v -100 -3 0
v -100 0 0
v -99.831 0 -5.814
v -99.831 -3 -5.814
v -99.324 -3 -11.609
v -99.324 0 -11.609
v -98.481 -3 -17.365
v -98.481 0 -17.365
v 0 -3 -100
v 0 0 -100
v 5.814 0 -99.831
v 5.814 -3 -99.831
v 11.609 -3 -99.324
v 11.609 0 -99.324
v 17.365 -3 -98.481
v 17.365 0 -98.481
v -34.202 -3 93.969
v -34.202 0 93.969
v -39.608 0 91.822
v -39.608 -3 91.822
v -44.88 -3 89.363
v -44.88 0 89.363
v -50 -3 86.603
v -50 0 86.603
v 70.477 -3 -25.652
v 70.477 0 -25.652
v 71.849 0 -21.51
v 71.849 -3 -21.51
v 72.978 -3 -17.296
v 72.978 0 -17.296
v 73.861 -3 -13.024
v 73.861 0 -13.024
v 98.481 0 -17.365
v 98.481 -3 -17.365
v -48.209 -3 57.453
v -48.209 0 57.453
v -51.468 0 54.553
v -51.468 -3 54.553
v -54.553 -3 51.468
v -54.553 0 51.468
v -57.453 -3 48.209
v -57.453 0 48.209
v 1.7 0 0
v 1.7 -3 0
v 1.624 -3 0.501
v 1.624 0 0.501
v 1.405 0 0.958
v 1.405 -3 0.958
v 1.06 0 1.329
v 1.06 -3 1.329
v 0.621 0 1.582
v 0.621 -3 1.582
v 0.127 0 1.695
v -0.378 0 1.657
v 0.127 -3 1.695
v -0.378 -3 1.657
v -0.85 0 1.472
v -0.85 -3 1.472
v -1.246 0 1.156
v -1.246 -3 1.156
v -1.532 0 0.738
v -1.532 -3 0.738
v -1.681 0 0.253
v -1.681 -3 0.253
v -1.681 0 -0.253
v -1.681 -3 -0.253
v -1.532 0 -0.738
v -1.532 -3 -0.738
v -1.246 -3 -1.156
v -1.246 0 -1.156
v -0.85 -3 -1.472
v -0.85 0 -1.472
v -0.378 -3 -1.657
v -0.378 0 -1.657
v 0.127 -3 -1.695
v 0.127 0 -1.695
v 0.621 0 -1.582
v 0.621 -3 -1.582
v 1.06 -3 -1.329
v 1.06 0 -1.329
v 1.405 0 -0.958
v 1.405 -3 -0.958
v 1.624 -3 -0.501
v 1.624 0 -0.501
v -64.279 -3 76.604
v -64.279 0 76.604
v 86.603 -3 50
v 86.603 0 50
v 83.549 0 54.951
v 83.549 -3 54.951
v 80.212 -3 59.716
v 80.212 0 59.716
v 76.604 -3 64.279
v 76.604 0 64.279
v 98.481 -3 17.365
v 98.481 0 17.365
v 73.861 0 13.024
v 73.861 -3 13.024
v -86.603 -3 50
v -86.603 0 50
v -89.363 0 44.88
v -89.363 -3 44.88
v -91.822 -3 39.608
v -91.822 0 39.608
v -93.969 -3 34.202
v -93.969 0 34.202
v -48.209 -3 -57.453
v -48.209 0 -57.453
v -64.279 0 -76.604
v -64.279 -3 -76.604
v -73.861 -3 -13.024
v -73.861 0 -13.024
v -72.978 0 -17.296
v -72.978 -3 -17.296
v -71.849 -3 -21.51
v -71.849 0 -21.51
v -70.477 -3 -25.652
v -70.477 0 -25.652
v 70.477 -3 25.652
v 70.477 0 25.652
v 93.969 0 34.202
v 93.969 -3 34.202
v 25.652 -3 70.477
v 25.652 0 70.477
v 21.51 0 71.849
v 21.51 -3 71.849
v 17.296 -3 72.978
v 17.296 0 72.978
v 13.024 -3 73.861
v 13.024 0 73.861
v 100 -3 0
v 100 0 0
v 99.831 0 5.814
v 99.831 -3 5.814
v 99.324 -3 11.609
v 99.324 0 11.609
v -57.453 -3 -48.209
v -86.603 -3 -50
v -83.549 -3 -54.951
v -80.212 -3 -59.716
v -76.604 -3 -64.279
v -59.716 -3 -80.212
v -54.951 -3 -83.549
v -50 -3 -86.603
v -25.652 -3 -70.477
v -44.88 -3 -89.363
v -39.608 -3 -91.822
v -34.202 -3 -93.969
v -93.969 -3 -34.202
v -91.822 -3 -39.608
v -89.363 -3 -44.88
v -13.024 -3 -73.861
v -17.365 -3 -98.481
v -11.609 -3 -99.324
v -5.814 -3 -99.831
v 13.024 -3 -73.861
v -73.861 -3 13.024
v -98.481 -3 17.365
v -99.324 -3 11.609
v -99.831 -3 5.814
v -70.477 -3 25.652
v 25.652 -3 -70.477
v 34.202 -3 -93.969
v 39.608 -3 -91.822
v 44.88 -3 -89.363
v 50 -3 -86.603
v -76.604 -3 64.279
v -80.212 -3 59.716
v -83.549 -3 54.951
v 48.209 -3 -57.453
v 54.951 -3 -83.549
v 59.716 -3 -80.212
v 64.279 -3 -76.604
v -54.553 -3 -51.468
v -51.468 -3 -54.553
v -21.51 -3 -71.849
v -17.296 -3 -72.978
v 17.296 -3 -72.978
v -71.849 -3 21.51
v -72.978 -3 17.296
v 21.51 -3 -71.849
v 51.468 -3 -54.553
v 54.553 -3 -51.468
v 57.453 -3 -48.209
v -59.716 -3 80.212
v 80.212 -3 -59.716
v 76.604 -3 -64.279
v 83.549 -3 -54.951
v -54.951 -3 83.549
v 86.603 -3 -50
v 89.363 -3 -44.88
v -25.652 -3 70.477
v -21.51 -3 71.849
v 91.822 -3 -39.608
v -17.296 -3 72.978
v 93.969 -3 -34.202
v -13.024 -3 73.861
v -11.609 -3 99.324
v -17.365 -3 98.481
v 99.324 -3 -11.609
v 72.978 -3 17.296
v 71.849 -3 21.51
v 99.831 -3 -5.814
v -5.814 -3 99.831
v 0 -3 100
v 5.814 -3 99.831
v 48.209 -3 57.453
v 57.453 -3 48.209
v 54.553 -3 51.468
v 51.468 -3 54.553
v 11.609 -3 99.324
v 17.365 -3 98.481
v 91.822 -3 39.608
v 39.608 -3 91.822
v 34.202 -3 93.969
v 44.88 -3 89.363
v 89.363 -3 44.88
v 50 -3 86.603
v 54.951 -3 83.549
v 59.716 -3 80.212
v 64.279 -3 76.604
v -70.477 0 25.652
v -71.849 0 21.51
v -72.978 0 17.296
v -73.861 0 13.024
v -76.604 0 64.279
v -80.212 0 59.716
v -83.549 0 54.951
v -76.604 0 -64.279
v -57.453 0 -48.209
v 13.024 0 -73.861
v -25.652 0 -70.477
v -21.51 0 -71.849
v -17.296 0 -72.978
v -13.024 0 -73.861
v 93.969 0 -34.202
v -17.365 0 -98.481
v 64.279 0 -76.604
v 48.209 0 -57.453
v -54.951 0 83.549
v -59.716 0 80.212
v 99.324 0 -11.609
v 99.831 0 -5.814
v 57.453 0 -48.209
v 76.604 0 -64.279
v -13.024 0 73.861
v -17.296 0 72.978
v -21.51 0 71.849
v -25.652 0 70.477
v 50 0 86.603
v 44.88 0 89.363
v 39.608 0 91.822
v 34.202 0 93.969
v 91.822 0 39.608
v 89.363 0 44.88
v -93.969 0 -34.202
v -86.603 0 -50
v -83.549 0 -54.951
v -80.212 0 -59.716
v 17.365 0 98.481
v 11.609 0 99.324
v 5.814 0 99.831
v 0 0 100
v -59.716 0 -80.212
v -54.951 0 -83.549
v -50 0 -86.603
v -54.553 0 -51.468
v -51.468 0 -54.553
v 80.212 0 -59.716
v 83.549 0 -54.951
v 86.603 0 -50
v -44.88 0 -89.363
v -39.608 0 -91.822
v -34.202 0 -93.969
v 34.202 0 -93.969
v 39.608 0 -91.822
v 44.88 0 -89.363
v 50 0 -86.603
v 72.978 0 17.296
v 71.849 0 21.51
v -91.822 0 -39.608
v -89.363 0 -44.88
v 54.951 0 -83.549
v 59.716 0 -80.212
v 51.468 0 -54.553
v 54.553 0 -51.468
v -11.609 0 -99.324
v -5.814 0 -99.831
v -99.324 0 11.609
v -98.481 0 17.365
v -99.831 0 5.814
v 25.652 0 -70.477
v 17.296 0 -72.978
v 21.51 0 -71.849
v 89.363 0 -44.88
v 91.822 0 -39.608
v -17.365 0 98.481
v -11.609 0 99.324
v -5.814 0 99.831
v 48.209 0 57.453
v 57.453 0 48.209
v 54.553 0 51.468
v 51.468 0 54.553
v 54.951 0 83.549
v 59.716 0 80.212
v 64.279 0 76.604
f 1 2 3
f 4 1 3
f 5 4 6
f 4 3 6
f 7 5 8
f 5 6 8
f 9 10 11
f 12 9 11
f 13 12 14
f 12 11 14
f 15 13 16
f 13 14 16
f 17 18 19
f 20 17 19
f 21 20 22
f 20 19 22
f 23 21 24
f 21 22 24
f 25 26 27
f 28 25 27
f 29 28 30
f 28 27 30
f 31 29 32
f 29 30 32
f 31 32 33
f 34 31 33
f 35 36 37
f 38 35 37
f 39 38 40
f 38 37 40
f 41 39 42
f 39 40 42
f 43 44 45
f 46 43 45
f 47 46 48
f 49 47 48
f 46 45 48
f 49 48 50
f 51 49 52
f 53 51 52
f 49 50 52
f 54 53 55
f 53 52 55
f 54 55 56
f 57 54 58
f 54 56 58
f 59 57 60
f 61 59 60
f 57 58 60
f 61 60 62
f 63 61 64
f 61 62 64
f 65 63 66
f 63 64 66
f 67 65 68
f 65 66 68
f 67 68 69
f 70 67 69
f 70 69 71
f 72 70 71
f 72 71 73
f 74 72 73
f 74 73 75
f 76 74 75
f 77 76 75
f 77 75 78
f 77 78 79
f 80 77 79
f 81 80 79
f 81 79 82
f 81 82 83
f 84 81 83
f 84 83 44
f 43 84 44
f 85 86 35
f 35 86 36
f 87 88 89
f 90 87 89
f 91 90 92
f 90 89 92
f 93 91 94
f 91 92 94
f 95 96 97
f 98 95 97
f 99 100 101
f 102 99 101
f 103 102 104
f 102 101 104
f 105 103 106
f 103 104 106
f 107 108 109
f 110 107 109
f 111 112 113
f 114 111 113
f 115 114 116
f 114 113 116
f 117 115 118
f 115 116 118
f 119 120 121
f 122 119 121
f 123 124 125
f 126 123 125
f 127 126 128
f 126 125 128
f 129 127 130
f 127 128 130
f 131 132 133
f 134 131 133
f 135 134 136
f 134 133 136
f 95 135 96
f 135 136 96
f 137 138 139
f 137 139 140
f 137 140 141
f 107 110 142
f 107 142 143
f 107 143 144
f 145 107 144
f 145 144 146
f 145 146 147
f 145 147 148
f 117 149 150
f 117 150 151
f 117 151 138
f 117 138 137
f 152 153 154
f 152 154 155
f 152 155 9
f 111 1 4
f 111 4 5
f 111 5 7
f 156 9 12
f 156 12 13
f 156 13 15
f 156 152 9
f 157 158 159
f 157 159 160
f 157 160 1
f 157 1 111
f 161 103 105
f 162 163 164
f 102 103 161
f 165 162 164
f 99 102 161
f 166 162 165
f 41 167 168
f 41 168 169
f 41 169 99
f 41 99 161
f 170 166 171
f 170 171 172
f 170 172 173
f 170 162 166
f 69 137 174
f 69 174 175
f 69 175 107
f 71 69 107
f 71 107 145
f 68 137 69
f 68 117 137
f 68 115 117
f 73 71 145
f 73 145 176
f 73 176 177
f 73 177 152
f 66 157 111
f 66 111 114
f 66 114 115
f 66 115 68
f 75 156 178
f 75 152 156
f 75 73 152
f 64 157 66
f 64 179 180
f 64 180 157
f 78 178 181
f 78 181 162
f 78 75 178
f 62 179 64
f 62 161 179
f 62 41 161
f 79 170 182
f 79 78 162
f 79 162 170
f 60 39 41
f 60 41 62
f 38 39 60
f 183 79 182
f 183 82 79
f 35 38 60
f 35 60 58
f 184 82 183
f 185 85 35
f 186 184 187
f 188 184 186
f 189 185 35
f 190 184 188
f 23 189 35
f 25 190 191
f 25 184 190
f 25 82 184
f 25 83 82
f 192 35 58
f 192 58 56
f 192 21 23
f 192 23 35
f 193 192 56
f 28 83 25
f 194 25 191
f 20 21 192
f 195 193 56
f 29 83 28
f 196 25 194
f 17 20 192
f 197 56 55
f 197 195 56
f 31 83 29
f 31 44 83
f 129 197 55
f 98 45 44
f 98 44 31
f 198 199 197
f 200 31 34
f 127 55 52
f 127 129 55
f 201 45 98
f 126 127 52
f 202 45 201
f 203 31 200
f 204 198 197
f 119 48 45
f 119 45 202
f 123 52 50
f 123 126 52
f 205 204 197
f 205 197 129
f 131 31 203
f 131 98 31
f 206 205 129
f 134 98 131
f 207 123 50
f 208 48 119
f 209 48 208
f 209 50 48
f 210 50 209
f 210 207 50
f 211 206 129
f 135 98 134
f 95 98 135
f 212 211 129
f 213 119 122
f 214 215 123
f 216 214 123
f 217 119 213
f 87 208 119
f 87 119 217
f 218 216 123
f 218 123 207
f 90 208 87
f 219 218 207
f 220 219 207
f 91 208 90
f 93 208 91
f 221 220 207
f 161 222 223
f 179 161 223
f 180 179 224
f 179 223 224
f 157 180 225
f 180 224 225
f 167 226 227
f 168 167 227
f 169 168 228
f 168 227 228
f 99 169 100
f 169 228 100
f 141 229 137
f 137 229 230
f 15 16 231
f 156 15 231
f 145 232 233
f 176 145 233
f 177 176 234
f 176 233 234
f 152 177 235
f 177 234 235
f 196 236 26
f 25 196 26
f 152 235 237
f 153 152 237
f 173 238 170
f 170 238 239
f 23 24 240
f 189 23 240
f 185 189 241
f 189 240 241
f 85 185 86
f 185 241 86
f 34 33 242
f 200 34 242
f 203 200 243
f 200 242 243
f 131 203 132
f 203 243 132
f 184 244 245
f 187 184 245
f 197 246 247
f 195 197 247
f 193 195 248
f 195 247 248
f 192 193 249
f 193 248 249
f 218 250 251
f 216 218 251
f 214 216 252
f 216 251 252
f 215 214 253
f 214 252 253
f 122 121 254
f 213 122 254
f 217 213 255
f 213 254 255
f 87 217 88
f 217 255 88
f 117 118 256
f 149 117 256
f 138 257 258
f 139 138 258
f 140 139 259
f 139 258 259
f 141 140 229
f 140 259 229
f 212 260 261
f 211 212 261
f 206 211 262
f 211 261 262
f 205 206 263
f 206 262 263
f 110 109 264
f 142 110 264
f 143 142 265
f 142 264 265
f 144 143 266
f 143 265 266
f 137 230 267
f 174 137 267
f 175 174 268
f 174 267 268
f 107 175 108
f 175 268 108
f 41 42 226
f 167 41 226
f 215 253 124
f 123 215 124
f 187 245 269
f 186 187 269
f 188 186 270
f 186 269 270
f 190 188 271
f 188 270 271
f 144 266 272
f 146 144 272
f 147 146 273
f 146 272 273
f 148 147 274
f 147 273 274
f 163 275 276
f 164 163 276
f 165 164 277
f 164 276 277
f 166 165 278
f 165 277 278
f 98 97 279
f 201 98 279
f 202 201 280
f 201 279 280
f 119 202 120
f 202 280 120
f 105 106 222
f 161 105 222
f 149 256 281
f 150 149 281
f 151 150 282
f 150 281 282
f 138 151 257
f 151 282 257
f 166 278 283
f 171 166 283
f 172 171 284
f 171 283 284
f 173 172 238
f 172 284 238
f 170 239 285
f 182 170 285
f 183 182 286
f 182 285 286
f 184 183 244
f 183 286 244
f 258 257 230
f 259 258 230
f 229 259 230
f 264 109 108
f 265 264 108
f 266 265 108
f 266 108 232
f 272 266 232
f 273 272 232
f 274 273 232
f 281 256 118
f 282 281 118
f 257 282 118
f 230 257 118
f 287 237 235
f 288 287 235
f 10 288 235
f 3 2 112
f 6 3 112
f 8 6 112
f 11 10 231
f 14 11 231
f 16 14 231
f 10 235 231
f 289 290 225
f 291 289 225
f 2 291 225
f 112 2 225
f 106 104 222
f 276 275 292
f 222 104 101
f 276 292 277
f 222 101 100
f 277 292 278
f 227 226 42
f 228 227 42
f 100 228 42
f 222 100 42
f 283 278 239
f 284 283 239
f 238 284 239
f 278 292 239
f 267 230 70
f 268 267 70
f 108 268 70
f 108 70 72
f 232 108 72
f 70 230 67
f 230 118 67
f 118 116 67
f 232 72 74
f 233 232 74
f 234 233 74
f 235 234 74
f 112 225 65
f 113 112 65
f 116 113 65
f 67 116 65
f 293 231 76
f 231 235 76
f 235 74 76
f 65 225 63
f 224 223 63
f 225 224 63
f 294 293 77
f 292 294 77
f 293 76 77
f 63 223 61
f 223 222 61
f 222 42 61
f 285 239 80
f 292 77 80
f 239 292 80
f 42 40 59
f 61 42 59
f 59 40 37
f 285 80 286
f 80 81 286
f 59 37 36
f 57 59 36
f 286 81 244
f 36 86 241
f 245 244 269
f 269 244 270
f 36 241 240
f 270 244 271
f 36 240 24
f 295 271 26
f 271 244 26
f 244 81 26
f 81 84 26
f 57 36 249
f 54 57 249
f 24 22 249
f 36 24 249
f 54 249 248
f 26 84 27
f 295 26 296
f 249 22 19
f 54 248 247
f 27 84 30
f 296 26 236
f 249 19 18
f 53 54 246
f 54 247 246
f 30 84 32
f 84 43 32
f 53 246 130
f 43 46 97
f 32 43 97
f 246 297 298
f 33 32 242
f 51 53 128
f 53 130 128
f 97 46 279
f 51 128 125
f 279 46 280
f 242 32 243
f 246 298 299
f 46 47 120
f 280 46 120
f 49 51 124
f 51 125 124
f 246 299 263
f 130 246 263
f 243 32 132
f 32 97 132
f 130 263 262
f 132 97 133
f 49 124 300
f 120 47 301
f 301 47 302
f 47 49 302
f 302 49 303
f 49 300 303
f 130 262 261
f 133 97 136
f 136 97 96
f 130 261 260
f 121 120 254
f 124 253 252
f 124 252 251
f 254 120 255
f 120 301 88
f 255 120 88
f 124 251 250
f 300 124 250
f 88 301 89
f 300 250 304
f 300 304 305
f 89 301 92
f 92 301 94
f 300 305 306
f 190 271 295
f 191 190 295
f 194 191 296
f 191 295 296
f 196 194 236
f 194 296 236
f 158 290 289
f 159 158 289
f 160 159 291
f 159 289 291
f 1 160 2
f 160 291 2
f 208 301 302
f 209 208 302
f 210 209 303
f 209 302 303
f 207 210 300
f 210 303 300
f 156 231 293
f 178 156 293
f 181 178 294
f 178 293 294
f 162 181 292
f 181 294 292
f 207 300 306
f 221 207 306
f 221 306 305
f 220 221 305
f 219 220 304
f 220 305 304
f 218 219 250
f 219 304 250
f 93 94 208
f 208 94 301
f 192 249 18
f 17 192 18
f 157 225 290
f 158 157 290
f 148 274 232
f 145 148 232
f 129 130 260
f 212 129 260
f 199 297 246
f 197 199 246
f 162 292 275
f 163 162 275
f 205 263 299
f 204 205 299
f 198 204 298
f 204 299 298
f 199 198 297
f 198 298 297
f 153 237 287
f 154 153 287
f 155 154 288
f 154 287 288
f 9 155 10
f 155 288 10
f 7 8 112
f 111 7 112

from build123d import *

# Parameters (mm, degrees)
F1_DEPTH = 3
F2_R     = 1.7
F3_DEPTH = 3.001


with BuildPart() as f1:
    # F0 (on Front) → F1 (new body)
    with BuildSketch(Plane.XZ):
        with BuildLine():
            Line((0, 0), (75, 0))
            ThreePointArc((75, 0), (74.7146023569, 6.5366807061), (73.8605814759, 13.023613325))
            Line((73.8605814759, 13.023613325), (0, 0))
        make_face()
        with BuildLine():
            Line((100, 0), (75, 0))
            ThreePointArc((75, 0), (74.7146023569, -6.5366807061), (73.8605814759, -13.023613325))
            Line((73.8605814759, -13.023613325), (98.4807753012, -17.3648177667))
            ThreePointArc((98.4807753012, -17.3648177667), (99.6194698092, -8.7155742748), (100, 0))
        make_face()
        with BuildLine():
            ThreePointArc((73.8605814759, -13.023613325), (74.7146023569, -6.5366807061), (75, 0))
            Line((75, 0), (0, 0))
            Line((0, 0), (73.8605814759, -13.023613325))
        make_face()
        with BuildLine():
            ThreePointArc((73.8605814759, 13.023613325), (74.7146023569, 6.5366807061), (75, 0))
            Line((75, 0), (100, 0))
            ThreePointArc((100, 0), (99.6194698092, 8.7155742748), (98.4807753012, 17.3648177667))
            Line((98.4807753012, 17.3648177667), (73.8605814759, 13.023613325))
        make_face()
        with BuildLine():
            Line((0, 0), (73.8605814759, 13.023613325))
            ThreePointArc((73.8605814759, 13.023613325), (72.4444369717, 19.4114283827), (70.4769465589, 25.6515107494))
            Line((70.4769465589, 25.6515107494), (0, 0))
        make_face()
        with BuildLine():
            ThreePointArc((70.4769465589, -25.6515107494), (72.4444369717, -19.4114283827), (73.8605814759, -13.023613325))
            Line((73.8605814759, -13.023613325), (0, 0))
            Line((0, 0), (70.4769465589, -25.6515107494))
        make_face()
        with BuildLine():
            Line((-13.023613325, 73.8605814759), (0, 0))
            Line((0, 0), (0, 75))
            ThreePointArc((0, 75), (-6.5366807061, 74.7146023569), (-13.023613325, 73.8605814759))
        make_face()
        with BuildLine():
            Line((13.023613325, -73.8605814759), (0, 0))
            Line((0, 0), (0, -75))
            ThreePointArc((0, -75), (6.5366807061, -74.7146023569), (13.023613325, -73.8605814759))
        make_face()
        with BuildLine():
            Line((-73.8605814759, -13.023613325), (0, 0))
            Line((0, 0), (-75, 0))
            ThreePointArc((-75, 0), (-74.7146023569, -6.5366807061), (-73.8605814759, -13.023613325))
        make_face()
        with BuildLine():
            Line((25.6515107494, 70.4769465589), (0, 0))
            Line((0, 0), (37.5, 64.9519052838))
            ThreePointArc((37.5, 64.9519052838), (31.6963696306, 67.9730840277), (25.6515107494, 70.4769465589))
        make_face()
        with BuildLine():
            Line((57.4533332339, 48.2090707265), (0, 0))
            Line((0, 0), (64.9519052838, 37.5))
            ThreePointArc((64.9519052838, 37.5), (61.4364033217, 43.0182327263), (57.4533332339, 48.2090707265))
        make_face()
        with BuildLine():
            Line((70.4769465589, -25.6515107494), (0, 0))
            Line((0, 0), (64.9519052838, -37.5))
            ThreePointArc((64.9519052838, -37.5), (67.9730840277, -31.6963696306), (70.4769465589, -25.6515107494))
        make_face()
        with BuildLine():
            Line((48.2090707265, -57.4533332339), (0, 0))
            Line((0, 0), (37.5, -64.9519052838))
            ThreePointArc((37.5, -64.9519052838), (43.0182327263, -61.4364033217), (48.2090707265, -57.4533332339))
        make_face()
        with BuildLine():
            Line((-48.2090707265, 57.4533332339), (0, 0))
            Line((0, 0), (-37.5, 64.9519052838))
            ThreePointArc((-37.5, 64.9519052838), (-43.0182327263, 61.4364033217), (-48.2090707265, 57.4533332339))
        make_face()
        with BuildLine():
            Line((-70.4769465589, 25.6515107494), (0, 0))
            Line((0, 0), (-64.9519052838, 37.5))
            ThreePointArc((-64.9519052838, 37.5), (-67.9730840277, 31.6963696306), (-70.4769465589, 25.6515107494))
        make_face()
        with BuildLine():
            Line((-57.4533332339, -48.2090707265), (0, 0))
            Line((0, 0), (-64.9519052838, -37.5))
            ThreePointArc((-64.9519052838, -37.5), (-61.4364033217, -43.0182327263), (-57.4533332339, -48.2090707265))
        make_face()
        with BuildLine():
            Line((-25.6515107494, -70.4769465589), (0, 0))
            Line((0, 0), (-37.5, -64.9519052838))
            ThreePointArc((-37.5, -64.9519052838), (-31.6963696306, -67.9730840277), (-25.6515107494, -70.4769465589))
        make_face()
        with BuildLine():
            Line((-25.6515107494, 70.4769465589), (0, 0))
            Line((0, 0), (-13.023613325, 73.8605814759))
            ThreePointArc((-13.023613325, 73.8605814759), (-19.4114283827, 72.4444369717), (-25.6515107494, 70.4769465589))
        make_face()
        with BuildLine():
            Line((0, 75), (0, 0))
            Line((0, 0), (13.023613325, 73.8605814759))
            ThreePointArc((13.023613325, 73.8605814759), (6.5366807061, 74.7146023569), (0, 75))
        make_face()
        with BuildLine():
            Line((13.023613325, 73.8605814759), (0, 0))
            Line((0, 0), (25.6515107494, 70.4769465589))
            ThreePointArc((25.6515107494, 70.4769465589), (19.4114283827, 72.4444369717), (13.023613325, 73.8605814759))
        make_face()
        with BuildLine():
            Line((37.5, 64.9519052838), (0, 0))
            Line((0, 0), (48.2090707265, 57.4533332339))
            ThreePointArc((48.2090707265, 57.4533332339), (43.0182327263, 61.4364033217), (37.5, 64.9519052838))
        make_face()
        with BuildLine():
            Line((48.2090707265, 57.4533332339), (0, 0))
            Line((0, 0), (57.4533332339, 48.2090707265))
            ThreePointArc((57.4533332339, 48.2090707265), (53.033008589, 53.033008589), (48.2090707265, 57.4533332339))
        make_face()
        with BuildLine():
            Line((64.9519052838, 37.5), (0, 0))
            Line((0, 0), (70.4769465589, 25.6515107494))
            ThreePointArc((70.4769465589, 25.6515107494), (67.9730840277, 31.6963696306), (64.9519052838, 37.5))
        make_face()
        with BuildLine():
            Line((64.9519052838, -37.5), (0, 0))
            Line((0, 0), (57.4533332339, -48.2090707265))
            ThreePointArc((57.4533332339, -48.2090707265), (61.4364033217, -43.0182327263), (64.9519052838, -37.5))
        make_face()
        with BuildLine():
            Line((57.4533332339, -48.2090707265), (0, 0))
            Line((0, 0), (48.2090707265, -57.4533332339))
            ThreePointArc((48.2090707265, -57.4533332339), (53.033008589, -53.033008589), (57.4533332339, -48.2090707265))
        make_face()
        with BuildLine():
            Line((37.5, -64.9519052838), (0, 0))
            Line((0, 0), (25.6515107494, -70.4769465589))
            ThreePointArc((25.6515107494, -70.4769465589), (31.6963696306, -67.9730840277), (37.5, -64.9519052838))
        make_face()
        with BuildLine():
            Line((25.6515107494, -70.4769465589), (0, 0))
            Line((0, 0), (13.023613325, -73.8605814759))
            ThreePointArc((13.023613325, -73.8605814759), (19.4114283827, -72.4444369717), (25.6515107494, -70.4769465589))
        make_face()
        with BuildLine():
            Line((0, -75), (0, 0))
            Line((0, 0), (-13.023613325, -73.8605814759))
            ThreePointArc((-13.023613325, -73.8605814759), (-6.5366807061, -74.7146023569), (0, -75))
        make_face()
        with BuildLine():
            Line((-13.023613325, -73.8605814759), (0, 0))
            Line((0, 0), (-25.6515107494, -70.4769465589))
            ThreePointArc((-25.6515107494, -70.4769465589), (-19.4114283827, -72.4444369717), (-13.023613325, -73.8605814759))
        make_face()
        with BuildLine():
            Line((-37.5, -64.9519052838), (0, 0))
            Line((0, 0), (-48.2090707265, -57.4533332339))
            ThreePointArc((-48.2090707265, -57.4533332339), (-43.0182327263, -61.4364033217), (-37.5, -64.9519052838))
        make_face()
        with BuildLine():
            Line((-48.2090707265, -57.4533332339), (0, 0))
            Line((0, 0), (-57.4533332339, -48.2090707265))
            ThreePointArc((-57.4533332339, -48.2090707265), (-53.033008589, -53.033008589), (-48.2090707265, -57.4533332339))
        make_face()
        with BuildLine():
            Line((-64.9519052838, -37.5), (0, 0))
            Line((0, 0), (-70.4769465589, -25.6515107494))
            ThreePointArc((-70.4769465589, -25.6515107494), (-67.9730840277, -31.6963696306), (-64.9519052838, -37.5))
        make_face()
        with BuildLine():
            Line((-70.4769465589, -25.6515107494), (0, 0))
            Line((0, 0), (-73.8605814759, -13.023613325))
            ThreePointArc((-73.8605814759, -13.023613325), (-72.4444369717, -19.4114283827), (-70.4769465589, -25.6515107494))
        make_face()
        with BuildLine():
            Line((-73.8605814759, 13.023613325), (0, 0))
            Line((0, 0), (-70.4769465589, 25.6515107494))
            ThreePointArc((-70.4769465589, 25.6515107494), (-72.4444369717, 19.4114283827), (-73.8605814759, 13.023613325))
        make_face()
        with BuildLine():
            Line((-64.9519052838, 37.5), (0, 0))
            Line((0, 0), (-57.4533332339, 48.2090707265))
            ThreePointArc((-57.4533332339, 48.2090707265), (-61.4364033217, 43.0182327263), (-64.9519052838, 37.5))
        make_face()
        with BuildLine():
            Line((-57.4533332339, 48.2090707265), (0, 0))
            Line((0, 0), (-48.2090707265, 57.4533332339))
            ThreePointArc((-48.2090707265, 57.4533332339), (-53.033008589, 53.033008589), (-57.4533332339, 48.2090707265))
        make_face()
        with BuildLine():
            Line((-37.5, 64.9519052838), (0, 0))
            Line((0, 0), (-25.6515107494, 70.4769465589))
            ThreePointArc((-25.6515107494, 70.4769465589), (-31.6963696306, 67.9730840277), (-37.5, 64.9519052838))
        make_face()
        with BuildLine():
            Line((-75, 0), (0, 0))
            Line((0, 0), (-73.8605814759, 13.023613325))
            ThreePointArc((-73.8605814759, 13.023613325), (-74.7146023569, 6.5366807061), (-75, 0))
        make_face()
        with BuildLine():
            ThreePointArc((64.9519052838, 37.5), (67.9730840277, 31.6963696306), (70.4769465589, 25.6515107494))
            Line((70.4769465589, 25.6515107494), (93.9692620786, 34.2020143326))
            ThreePointArc((93.9692620786, 34.2020143326), (90.6307787037, 42.2618261741), (86.6025403784, 50))
            Line((86.6025403784, 50), (64.9519052838, 37.5))
        make_face()
        with BuildLine():
            Line((93.9692620786, -34.2020143326), (70.4769465589, -25.6515107494))
            ThreePointArc((70.4769465589, -25.6515107494), (67.9730840277, -31.6963696306), (64.9519052838, -37.5))
            Line((64.9519052838, -37.5), (86.6025403784, -50))
            ThreePointArc((86.6025403784, -50), (90.6307787037, -42.2618261741), (93.9692620786, -34.2020143326))
        make_face()
        with BuildLine():
            Line((0, 100), (0, 75))
            ThreePointArc((0, 75), (6.5366807061, 74.7146023569), (13.023613325, 73.8605814759))
            Line((13.023613325, 73.8605814759), (17.3648177667, 98.4807753012))
            ThreePointArc((17.3648177667, 98.4807753012), (8.7155742748, 99.6194698092), (0, 100))
        make_face()
        with BuildLine():
            ThreePointArc((-13.023613325, 73.8605814759), (-6.5366807061, 74.7146023569), (0, 75))
            Line((0, 75), (0, 100))
            ThreePointArc((0, 100), (-8.7155742748, 99.6194698092), (-17.3648177667, 98.4807753012))
            Line((-17.3648177667, 98.4807753012), (-13.023613325, 73.8605814759))
        make_face()
        with BuildLine():
            Line((0, -100), (0, -75))
            ThreePointArc((0, -75), (-6.5366807061, -74.7146023569), (-13.023613325, -73.8605814759))
            Line((-13.023613325, -73.8605814759), (-17.3648177667, -98.4807753012))
            ThreePointArc((-17.3648177667, -98.4807753012), (-8.7155742748, -99.6194698092), (0, -100))
        make_face()
        with BuildLine():
            ThreePointArc((13.023613325, -73.8605814759), (6.5366807061, -74.7146023569), (0, -75))
            Line((0, -75), (0, -100))
            ThreePointArc((0, -100), (8.7155742748, -99.6194698092), (17.3648177667, -98.4807753012))
            Line((17.3648177667, -98.4807753012), (13.023613325, -73.8605814759))
        make_face()
        with BuildLine():
            Line((-100, 0), (-75, 0))
            ThreePointArc((-75, 0), (-74.7146023569, 6.5366807061), (-73.8605814759, 13.023613325))
            Line((-73.8605814759, 13.023613325), (-98.4807753012, 17.3648177667))
            ThreePointArc((-98.4807753012, 17.3648177667), (-99.6194698092, 8.7155742748), (-100, 0))
        make_face()
        with BuildLine():
            ThreePointArc((-73.8605814759, -13.023613325), (-74.7146023569, -6.5366807061), (-75, 0))
            Line((-75, 0), (-100, 0))
            ThreePointArc((-100, 0), (-99.6194698092, -8.7155742748), (-98.4807753012, -17.3648177667))
            Line((-98.4807753012, -17.3648177667), (-73.8605814759, -13.023613325))
        make_face()
        with BuildLine():
            Line((50, 86.6025403784), (37.5, 64.9519052838))
            ThreePointArc((37.5, 64.9519052838), (43.0182327263, 61.4364033217), (48.2090707265, 57.4533332339))
            Line((48.2090707265, 57.4533332339), (64.2787609687, 76.6044443119))
            ThreePointArc((64.2787609687, 76.6044443119), (57.3576436351, 81.9152044289), (50, 86.6025403784))
        make_face()
        with BuildLine():
            ThreePointArc((25.6515107494, 70.4769465589), (31.6963696306, 67.9730840277), (37.5, 64.9519052838))
            Line((37.5, 64.9519052838), (50, 86.6025403784))
            ThreePointArc((50, 86.6025403784), (42.2618261741, 90.6307787037), (34.2020143326, 93.9692620786))
            Line((34.2020143326, 93.9692620786), (25.6515107494, 70.4769465589))
        make_face()
        with BuildLine():
            ThreePointArc((57.4533332339, 48.2090707265), (61.4364033217, 43.0182327263), (64.9519052838, 37.5))
            Line((64.9519052838, 37.5), (86.6025403784, 50))
            ThreePointArc((86.6025403784, 50), (81.9152044289, 57.3576436351), (76.6044443119, 64.2787609687))
            Line((76.6044443119, 64.2787609687), (57.4533332339, 48.2090707265))
        make_face()
        with BuildLine():
            Line((86.6025403784, -50), (64.9519052838, -37.5))
            ThreePointArc((64.9519052838, -37.5), (61.4364033217, -43.0182327263), (57.4533332339, -48.2090707265))
            Line((57.4533332339, -48.2090707265), (76.6044443119, -64.2787609687))
            ThreePointArc((76.6044443119, -64.2787609687), (81.9152044289, -57.3576436351), (86.6025403784, -50))
        make_face()
        with BuildLine():
            Line((50, -86.6025403784), (37.5, -64.9519052838))
            ThreePointArc((37.5, -64.9519052838), (31.6963696306, -67.9730840277), (25.6515107494, -70.4769465589))
            Line((25.6515107494, -70.4769465589), (34.2020143326, -93.9692620786))
            ThreePointArc((34.2020143326, -93.9692620786), (42.2618261741, -90.6307787037), (50, -86.6025403784))
        make_face()
        with BuildLine():
            ThreePointArc((48.2090707265, -57.4533332339), (43.0182327263, -61.4364033217), (37.5, -64.9519052838))
            Line((37.5, -64.9519052838), (50, -86.6025403784))
            ThreePointArc((50, -86.6025403784), (57.3576436351, -81.9152044289), (64.2787609687, -76.6044443119))
            Line((64.2787609687, -76.6044443119), (48.2090707265, -57.4533332339))
        make_face()
        with BuildLine():
            Line((-50, 86.6025403784), (-37.5, 64.9519052838))
            ThreePointArc((-37.5, 64.9519052838), (-31.6963696306, 67.9730840277), (-25.6515107494, 70.4769465589))
            Line((-25.6515107494, 70.4769465589), (-34.2020143326, 93.9692620786))
            ThreePointArc((-34.2020143326, 93.9692620786), (-42.2618261741, 90.6307787037), (-50, 86.6025403784))
        make_face()
        with BuildLine():
            ThreePointArc((-48.2090707265, 57.4533332339), (-43.0182327263, 61.4364033217), (-37.5, 64.9519052838))
            Line((-37.5, 64.9519052838), (-50, 86.6025403784))
            ThreePointArc((-50, 86.6025403784), (-57.3576436351, 81.9152044289), (-64.2787609687, 76.6044443119))
            Line((-64.2787609687, 76.6044443119), (-48.2090707265, 57.4533332339))
        make_face()
        with BuildLine():
            Line((-86.6025403784, 50), (-64.9519052838, 37.5))
            ThreePointArc((-64.9519052838, 37.5), (-61.4364033217, 43.0182327263), (-57.4533332339, 48.2090707265))
            Line((-57.4533332339, 48.2090707265), (-76.6044443119, 64.2787609687))
            ThreePointArc((-76.6044443119, 64.2787609687), (-81.9152044289, 57.3576436351), (-86.6025403784, 50))
        make_face()
        with BuildLine():
            ThreePointArc((-70.4769465589, 25.6515107494), (-67.9730840277, 31.6963696306), (-64.9519052838, 37.5))
            Line((-64.9519052838, 37.5), (-86.6025403784, 50))
            ThreePointArc((-86.6025403784, 50), (-90.6307787037, 42.2618261741), (-93.9692620786, 34.2020143326))
            Line((-93.9692620786, 34.2020143326), (-70.4769465589, 25.6515107494))
        make_face()
        with BuildLine():
            Line((-86.6025403784, -50), (-64.9519052838, -37.5))
            ThreePointArc((-64.9519052838, -37.5), (-67.9730840277, -31.6963696306), (-70.4769465589, -25.6515107494))
            Line((-70.4769465589, -25.6515107494), (-93.9692620786, -34.2020143326))
            ThreePointArc((-93.9692620786, -34.2020143326), (-90.6307787037, -42.2618261741), (-86.6025403784, -50))
        make_face()
        with BuildLine():
            ThreePointArc((-57.4533332339, -48.2090707265), (-61.4364033217, -43.0182327263), (-64.9519052838, -37.5))
            Line((-64.9519052838, -37.5), (-86.6025403784, -50))
            ThreePointArc((-86.6025403784, -50), (-81.9152044289, -57.3576436351), (-76.6044443119, -64.2787609687))
            Line((-76.6044443119, -64.2787609687), (-57.4533332339, -48.2090707265))
        make_face()
        with BuildLine():
            Line((-50, -86.6025403784), (-37.5, -64.9519052838))
            ThreePointArc((-37.5, -64.9519052838), (-43.0182327263, -61.4364033217), (-48.2090707265, -57.4533332339))
            Line((-48.2090707265, -57.4533332339), (-64.2787609687, -76.6044443119))
            ThreePointArc((-64.2787609687, -76.6044443119), (-57.3576436351, -81.9152044289), (-50, -86.6025403784))
        make_face()
        with BuildLine():
            ThreePointArc((-25.6515107494, -70.4769465589), (-31.6963696306, -67.9730840277), (-37.5, -64.9519052838))
            Line((-37.5, -64.9519052838), (-50, -86.6025403784))
            ThreePointArc((-50, -86.6025403784), (-42.2618261741, -90.6307787037), (-34.2020143326, -93.9692620786))
            Line((-34.2020143326, -93.9692620786), (-25.6515107494, -70.4769465589))
        make_face()
    extrude(amount=F1_DEPTH)

    # F2 (on face) → F3 (cut, through all)
    with BuildSketch(Plane.XZ.offset(3)):
        Circle(F2_R)
    extrude(amount=-F3_DEPTH, mode=Mode.SUBTRACT)


solid = f1.part
